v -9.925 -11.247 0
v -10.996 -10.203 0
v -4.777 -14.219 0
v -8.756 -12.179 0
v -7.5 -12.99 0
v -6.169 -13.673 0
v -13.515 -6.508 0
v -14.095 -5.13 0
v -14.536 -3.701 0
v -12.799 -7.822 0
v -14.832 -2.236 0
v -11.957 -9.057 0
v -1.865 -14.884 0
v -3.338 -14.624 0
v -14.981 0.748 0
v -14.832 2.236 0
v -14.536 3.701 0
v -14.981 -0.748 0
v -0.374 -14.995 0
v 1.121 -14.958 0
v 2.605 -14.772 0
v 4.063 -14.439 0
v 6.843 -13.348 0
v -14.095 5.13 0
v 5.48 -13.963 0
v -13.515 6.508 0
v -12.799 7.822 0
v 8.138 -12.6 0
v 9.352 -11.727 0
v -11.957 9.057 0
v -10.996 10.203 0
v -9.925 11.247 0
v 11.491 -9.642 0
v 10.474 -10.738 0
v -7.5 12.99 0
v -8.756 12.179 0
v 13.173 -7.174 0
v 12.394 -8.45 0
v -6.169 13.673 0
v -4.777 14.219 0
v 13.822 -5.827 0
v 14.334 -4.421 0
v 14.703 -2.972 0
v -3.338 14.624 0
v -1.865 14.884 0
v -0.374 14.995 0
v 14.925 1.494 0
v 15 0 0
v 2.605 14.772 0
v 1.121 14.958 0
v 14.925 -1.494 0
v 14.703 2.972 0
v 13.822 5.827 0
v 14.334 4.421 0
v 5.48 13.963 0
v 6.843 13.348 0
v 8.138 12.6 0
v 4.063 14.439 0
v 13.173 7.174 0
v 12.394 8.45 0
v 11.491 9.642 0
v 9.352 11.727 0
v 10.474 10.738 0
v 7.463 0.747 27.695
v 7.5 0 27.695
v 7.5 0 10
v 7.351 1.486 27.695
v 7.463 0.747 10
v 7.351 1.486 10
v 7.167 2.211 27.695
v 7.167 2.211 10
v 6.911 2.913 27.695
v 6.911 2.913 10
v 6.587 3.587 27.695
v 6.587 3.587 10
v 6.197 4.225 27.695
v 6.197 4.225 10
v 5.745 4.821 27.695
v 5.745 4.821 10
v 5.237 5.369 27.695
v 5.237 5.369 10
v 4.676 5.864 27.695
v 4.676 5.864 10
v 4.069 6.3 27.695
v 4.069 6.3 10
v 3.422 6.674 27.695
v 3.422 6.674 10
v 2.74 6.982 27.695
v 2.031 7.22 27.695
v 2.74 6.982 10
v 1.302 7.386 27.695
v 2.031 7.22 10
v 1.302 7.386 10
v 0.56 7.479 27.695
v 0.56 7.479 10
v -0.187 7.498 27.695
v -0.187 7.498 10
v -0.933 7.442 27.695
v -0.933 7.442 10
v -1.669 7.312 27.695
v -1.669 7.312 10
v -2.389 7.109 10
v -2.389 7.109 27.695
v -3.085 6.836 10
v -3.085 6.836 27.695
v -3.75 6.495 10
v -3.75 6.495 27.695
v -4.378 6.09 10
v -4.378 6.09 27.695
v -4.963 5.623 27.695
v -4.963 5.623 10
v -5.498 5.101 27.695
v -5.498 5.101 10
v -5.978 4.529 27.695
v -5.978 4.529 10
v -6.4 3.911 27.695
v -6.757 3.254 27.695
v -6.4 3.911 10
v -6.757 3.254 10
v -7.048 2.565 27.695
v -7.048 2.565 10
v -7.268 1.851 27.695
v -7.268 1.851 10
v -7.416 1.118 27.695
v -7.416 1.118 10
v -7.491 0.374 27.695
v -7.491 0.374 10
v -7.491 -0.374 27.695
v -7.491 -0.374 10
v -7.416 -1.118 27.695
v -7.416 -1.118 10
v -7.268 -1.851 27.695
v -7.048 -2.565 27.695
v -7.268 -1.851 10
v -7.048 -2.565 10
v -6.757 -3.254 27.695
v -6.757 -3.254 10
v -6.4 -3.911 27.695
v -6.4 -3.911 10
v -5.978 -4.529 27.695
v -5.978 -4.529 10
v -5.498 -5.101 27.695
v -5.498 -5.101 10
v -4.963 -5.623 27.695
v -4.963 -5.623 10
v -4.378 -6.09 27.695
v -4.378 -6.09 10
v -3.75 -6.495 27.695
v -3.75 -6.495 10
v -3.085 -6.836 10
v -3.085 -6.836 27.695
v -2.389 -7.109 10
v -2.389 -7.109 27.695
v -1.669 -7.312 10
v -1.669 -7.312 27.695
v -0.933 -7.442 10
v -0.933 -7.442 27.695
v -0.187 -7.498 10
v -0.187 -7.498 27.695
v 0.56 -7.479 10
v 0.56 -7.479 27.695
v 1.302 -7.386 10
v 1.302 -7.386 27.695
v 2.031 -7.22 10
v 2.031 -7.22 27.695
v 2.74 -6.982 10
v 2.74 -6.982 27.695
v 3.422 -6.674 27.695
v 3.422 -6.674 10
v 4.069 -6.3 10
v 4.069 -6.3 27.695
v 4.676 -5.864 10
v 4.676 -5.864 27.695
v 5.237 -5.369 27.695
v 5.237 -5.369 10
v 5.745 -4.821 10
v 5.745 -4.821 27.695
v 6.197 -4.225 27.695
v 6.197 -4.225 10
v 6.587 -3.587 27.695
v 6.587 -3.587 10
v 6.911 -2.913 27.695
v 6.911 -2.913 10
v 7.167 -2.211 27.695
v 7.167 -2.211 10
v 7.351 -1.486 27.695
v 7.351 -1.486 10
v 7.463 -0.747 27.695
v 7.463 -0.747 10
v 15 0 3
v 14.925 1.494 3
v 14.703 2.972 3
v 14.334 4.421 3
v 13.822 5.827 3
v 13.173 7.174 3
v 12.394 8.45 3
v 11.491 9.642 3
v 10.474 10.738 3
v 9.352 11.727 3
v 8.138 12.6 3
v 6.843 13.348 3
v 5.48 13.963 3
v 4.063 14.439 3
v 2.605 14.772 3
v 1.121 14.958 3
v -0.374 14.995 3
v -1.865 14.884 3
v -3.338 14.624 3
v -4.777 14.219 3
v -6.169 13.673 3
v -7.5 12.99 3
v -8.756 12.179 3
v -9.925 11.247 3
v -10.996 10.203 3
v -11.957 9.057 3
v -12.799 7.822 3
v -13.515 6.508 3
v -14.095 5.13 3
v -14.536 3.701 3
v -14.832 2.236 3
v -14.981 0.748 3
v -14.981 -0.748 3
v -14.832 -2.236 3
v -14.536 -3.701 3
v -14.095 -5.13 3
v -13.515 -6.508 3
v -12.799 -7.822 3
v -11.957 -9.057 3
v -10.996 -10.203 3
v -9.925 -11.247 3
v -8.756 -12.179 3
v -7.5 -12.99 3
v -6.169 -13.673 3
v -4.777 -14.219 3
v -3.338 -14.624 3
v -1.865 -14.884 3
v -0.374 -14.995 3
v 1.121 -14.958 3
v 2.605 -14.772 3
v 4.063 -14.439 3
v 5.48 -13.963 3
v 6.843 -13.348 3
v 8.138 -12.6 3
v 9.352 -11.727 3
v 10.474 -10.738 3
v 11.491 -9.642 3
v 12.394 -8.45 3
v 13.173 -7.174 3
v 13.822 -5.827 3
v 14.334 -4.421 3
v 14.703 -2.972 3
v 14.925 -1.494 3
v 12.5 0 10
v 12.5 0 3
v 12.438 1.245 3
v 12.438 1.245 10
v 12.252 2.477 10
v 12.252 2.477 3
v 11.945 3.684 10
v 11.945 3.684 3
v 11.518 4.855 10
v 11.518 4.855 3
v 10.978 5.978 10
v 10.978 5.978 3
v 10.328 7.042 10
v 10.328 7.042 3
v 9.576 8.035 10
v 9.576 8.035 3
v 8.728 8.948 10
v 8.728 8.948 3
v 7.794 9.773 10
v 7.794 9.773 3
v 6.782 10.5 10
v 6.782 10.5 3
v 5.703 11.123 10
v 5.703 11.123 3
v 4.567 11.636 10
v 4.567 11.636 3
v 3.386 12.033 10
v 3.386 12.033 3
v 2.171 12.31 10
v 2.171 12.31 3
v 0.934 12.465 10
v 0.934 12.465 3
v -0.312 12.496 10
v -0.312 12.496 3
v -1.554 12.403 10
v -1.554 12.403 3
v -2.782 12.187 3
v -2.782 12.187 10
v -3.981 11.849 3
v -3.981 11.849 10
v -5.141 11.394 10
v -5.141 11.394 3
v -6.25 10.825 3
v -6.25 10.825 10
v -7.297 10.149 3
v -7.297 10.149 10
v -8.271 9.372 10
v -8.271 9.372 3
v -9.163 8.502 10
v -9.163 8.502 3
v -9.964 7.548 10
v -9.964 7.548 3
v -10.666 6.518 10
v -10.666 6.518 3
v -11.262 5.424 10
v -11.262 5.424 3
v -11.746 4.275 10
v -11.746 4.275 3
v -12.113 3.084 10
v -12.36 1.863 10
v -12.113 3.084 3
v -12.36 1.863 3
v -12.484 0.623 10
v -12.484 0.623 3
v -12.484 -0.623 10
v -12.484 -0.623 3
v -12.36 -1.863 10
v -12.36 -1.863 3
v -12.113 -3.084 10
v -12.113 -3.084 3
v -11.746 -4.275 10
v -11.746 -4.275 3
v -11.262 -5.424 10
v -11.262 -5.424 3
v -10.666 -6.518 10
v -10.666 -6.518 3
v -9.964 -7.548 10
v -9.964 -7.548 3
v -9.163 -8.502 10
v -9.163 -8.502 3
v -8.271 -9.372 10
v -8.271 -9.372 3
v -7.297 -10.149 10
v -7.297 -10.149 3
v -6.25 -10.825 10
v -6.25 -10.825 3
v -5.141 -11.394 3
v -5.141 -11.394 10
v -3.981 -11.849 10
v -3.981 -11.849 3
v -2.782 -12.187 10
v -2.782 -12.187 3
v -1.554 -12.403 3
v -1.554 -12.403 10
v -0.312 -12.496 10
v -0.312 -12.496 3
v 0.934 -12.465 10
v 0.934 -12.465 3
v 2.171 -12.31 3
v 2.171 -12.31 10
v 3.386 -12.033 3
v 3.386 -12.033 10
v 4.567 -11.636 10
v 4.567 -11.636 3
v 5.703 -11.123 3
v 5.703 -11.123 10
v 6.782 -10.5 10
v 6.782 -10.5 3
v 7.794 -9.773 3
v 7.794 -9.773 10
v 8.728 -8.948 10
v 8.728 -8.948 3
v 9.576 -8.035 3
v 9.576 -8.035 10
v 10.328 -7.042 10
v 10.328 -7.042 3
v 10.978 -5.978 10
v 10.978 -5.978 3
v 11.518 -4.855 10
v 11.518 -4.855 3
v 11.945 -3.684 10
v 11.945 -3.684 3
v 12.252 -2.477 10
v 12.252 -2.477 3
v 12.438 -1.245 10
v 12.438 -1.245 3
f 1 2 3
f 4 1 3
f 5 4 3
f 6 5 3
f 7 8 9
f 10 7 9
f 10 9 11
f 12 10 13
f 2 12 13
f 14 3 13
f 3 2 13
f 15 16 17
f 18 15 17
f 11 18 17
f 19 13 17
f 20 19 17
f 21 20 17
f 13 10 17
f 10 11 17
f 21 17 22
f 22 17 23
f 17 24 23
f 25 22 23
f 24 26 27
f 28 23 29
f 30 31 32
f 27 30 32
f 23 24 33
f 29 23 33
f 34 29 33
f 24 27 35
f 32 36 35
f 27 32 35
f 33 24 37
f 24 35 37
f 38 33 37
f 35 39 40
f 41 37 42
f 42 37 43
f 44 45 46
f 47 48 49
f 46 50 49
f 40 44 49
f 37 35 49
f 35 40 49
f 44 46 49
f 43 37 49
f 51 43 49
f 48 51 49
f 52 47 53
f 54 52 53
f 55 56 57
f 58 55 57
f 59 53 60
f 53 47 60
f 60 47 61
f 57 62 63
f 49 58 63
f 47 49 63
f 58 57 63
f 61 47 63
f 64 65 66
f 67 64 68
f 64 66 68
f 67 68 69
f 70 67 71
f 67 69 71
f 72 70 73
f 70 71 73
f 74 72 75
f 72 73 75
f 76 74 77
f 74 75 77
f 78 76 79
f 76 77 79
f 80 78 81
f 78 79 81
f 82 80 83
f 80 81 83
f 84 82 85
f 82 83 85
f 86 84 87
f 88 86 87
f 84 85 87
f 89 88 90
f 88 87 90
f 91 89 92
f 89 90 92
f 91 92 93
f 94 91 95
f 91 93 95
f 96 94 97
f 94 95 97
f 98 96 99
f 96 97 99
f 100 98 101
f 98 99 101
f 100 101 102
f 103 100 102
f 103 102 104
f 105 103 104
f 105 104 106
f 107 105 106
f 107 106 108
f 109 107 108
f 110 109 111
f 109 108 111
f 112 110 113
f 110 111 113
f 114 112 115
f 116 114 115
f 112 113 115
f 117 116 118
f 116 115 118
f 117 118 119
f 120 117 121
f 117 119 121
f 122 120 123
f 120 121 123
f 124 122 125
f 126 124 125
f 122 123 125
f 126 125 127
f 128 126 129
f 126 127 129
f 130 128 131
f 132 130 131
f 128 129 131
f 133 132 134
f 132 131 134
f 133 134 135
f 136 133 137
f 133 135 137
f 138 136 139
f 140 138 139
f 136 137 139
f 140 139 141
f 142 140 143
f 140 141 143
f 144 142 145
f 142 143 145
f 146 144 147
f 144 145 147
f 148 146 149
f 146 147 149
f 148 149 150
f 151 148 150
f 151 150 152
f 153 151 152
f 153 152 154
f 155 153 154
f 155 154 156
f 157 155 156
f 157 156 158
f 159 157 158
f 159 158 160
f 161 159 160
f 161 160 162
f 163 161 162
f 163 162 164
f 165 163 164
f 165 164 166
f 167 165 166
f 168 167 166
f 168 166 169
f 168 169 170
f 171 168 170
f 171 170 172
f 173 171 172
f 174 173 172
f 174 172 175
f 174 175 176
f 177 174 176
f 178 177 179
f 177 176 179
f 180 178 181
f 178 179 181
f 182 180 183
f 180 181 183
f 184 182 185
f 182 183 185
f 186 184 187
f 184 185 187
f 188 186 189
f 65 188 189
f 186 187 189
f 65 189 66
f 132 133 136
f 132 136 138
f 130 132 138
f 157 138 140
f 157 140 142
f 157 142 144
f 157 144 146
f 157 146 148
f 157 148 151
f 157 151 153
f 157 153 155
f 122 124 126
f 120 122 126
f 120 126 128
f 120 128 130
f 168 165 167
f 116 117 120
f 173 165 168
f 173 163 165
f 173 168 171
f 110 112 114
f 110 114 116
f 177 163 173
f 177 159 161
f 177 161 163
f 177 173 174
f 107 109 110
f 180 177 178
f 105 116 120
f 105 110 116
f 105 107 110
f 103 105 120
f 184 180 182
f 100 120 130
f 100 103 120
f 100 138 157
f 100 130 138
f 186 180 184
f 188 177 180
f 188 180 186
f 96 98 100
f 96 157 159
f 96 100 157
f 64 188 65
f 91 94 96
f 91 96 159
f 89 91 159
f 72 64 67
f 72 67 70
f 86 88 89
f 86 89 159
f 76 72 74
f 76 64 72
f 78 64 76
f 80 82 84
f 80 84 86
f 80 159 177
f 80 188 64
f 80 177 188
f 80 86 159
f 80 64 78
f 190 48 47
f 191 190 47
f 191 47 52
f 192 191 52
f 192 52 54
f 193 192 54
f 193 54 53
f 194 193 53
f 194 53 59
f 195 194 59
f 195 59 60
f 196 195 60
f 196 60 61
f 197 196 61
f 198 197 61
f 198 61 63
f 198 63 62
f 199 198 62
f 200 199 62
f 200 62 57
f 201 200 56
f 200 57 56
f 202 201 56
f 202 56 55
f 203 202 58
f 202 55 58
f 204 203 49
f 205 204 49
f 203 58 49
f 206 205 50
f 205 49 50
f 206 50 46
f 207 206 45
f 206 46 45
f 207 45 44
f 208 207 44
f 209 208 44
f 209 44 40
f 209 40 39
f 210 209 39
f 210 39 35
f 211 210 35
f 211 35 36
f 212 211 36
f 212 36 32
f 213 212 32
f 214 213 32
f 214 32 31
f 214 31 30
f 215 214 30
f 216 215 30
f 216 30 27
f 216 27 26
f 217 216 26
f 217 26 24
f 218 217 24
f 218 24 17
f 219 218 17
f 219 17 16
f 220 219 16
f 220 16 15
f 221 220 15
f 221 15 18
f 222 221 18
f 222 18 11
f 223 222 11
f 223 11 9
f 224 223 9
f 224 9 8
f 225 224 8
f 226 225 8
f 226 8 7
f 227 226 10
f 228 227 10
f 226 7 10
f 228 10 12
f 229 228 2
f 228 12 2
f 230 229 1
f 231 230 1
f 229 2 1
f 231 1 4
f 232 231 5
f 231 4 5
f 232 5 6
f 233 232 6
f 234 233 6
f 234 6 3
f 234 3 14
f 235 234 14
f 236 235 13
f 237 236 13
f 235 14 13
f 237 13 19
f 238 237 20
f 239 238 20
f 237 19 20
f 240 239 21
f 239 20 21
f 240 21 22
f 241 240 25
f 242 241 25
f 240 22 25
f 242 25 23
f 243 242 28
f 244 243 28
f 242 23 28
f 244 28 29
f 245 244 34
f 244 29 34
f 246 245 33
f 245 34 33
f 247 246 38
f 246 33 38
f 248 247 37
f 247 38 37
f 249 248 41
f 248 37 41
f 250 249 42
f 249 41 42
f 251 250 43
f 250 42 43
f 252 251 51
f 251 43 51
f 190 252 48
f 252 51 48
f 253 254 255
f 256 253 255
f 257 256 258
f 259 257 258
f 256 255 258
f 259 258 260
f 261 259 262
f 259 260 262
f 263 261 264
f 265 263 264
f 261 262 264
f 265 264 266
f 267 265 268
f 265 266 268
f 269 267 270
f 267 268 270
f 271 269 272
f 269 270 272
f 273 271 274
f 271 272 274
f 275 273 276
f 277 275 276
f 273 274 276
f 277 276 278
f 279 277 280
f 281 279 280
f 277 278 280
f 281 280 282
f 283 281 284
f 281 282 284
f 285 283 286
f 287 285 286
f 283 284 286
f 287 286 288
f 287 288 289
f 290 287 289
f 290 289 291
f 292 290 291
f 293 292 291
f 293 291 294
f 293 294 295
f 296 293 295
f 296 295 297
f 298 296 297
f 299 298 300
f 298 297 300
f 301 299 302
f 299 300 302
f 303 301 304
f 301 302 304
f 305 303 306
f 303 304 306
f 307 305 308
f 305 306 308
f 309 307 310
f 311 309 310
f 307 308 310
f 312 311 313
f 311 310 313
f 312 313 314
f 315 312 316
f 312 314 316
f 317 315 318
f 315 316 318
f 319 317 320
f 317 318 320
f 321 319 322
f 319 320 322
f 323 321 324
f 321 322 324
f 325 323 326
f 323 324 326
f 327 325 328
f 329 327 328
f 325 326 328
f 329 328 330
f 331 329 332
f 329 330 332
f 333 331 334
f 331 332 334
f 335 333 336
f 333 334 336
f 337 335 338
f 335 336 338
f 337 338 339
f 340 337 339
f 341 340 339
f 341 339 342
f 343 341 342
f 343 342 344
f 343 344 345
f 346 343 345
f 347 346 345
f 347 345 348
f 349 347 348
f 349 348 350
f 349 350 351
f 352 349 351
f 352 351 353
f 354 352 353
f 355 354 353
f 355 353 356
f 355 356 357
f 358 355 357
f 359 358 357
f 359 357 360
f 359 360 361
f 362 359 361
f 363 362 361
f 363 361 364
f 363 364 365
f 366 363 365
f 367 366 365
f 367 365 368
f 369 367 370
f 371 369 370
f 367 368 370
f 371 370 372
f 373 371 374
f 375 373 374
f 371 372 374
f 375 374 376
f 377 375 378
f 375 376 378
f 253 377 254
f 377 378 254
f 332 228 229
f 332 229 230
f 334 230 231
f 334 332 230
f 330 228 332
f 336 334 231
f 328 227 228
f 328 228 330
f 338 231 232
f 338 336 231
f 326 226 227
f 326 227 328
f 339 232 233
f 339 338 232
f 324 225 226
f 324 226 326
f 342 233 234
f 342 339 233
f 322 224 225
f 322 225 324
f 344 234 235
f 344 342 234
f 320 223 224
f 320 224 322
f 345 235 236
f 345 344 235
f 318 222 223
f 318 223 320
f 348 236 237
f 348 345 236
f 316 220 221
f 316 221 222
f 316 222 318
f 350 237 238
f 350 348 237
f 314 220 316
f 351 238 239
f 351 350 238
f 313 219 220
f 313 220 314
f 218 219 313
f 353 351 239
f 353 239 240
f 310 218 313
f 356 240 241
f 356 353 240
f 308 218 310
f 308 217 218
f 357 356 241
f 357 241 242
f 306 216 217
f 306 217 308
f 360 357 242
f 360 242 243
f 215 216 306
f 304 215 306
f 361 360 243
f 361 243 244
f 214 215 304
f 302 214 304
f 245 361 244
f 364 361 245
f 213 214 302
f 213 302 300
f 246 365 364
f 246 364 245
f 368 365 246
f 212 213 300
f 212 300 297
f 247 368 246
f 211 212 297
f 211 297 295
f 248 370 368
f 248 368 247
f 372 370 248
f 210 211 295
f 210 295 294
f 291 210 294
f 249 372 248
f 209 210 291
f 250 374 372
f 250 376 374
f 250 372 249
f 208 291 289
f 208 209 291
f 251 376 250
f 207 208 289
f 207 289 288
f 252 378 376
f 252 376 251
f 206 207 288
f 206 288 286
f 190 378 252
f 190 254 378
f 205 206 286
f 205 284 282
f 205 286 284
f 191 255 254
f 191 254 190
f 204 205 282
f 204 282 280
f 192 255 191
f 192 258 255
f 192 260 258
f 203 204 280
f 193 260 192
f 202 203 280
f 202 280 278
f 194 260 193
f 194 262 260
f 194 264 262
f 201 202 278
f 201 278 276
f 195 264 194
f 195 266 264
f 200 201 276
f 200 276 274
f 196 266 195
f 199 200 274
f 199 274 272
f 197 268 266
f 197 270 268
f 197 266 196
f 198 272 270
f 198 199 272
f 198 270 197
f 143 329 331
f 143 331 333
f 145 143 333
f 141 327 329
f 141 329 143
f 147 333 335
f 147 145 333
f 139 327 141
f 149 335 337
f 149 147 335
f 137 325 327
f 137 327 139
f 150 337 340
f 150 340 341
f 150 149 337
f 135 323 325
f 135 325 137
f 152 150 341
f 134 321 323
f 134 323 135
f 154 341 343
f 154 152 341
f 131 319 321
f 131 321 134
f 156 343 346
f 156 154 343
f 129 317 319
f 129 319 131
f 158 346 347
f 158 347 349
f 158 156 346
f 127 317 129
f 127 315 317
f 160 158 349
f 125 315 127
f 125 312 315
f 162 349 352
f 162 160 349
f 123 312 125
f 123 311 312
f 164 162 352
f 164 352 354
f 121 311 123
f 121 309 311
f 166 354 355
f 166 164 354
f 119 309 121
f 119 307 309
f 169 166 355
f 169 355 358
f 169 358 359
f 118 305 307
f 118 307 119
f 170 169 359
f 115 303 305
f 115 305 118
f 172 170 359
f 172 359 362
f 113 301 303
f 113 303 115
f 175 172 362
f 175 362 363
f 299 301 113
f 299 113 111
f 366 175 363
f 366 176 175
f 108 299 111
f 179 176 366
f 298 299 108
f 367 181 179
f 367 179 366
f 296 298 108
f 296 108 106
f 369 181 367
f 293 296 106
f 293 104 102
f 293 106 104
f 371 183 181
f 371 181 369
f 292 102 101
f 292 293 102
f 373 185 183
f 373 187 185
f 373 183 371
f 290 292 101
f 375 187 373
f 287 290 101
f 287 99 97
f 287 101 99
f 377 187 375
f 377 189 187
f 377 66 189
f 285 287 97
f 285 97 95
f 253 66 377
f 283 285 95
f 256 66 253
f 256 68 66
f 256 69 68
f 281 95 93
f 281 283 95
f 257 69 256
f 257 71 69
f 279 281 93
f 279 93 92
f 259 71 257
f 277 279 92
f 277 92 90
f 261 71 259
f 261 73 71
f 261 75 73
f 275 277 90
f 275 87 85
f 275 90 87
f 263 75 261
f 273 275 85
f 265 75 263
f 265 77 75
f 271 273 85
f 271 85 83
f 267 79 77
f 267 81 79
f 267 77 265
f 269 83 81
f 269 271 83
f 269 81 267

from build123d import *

# Parameters (mm, degrees)
SKETCH2_R           = 15
BOSS_EXTRUDE1_DEPTH = 10
CUT_EXTRUDE1_START  = -7
SKETCH3_R           = 15
SKETCH3_R_2         = 12.5
CUT_EXTRUDE1_DEPTH  = 7
SKETCH4_R           = 7.5
BOSS_EXTRUDE4_DEPTH = 17.695


with BuildPart() as part:
    # Sketch2 → Boss-Extrude1 (new body)
    with BuildSketch(Plane.XY):
        Circle(SKETCH2_R)
    extrude(amount=BOSS_EXTRUDE1_DEPTH)

    # Sketch3 → Cut-Extrude1 (cut)
    with BuildSketch(Plane.XY.offset(10).offset(CUT_EXTRUDE1_START)):
        Circle(SKETCH3_R)
        Circle(SKETCH3_R_2, mode=Mode.SUBTRACT)
    extrude(amount=CUT_EXTRUDE1_DEPTH, mode=Mode.SUBTRACT)

    # Sketch4 → Boss-Extrude4 (add)
    with BuildSketch(Plane.XY.offset(10)):
        Circle(SKETCH4_R)
    extrude(amount=BOSS_EXTRUDE4_DEPTH)


solid = part.part
